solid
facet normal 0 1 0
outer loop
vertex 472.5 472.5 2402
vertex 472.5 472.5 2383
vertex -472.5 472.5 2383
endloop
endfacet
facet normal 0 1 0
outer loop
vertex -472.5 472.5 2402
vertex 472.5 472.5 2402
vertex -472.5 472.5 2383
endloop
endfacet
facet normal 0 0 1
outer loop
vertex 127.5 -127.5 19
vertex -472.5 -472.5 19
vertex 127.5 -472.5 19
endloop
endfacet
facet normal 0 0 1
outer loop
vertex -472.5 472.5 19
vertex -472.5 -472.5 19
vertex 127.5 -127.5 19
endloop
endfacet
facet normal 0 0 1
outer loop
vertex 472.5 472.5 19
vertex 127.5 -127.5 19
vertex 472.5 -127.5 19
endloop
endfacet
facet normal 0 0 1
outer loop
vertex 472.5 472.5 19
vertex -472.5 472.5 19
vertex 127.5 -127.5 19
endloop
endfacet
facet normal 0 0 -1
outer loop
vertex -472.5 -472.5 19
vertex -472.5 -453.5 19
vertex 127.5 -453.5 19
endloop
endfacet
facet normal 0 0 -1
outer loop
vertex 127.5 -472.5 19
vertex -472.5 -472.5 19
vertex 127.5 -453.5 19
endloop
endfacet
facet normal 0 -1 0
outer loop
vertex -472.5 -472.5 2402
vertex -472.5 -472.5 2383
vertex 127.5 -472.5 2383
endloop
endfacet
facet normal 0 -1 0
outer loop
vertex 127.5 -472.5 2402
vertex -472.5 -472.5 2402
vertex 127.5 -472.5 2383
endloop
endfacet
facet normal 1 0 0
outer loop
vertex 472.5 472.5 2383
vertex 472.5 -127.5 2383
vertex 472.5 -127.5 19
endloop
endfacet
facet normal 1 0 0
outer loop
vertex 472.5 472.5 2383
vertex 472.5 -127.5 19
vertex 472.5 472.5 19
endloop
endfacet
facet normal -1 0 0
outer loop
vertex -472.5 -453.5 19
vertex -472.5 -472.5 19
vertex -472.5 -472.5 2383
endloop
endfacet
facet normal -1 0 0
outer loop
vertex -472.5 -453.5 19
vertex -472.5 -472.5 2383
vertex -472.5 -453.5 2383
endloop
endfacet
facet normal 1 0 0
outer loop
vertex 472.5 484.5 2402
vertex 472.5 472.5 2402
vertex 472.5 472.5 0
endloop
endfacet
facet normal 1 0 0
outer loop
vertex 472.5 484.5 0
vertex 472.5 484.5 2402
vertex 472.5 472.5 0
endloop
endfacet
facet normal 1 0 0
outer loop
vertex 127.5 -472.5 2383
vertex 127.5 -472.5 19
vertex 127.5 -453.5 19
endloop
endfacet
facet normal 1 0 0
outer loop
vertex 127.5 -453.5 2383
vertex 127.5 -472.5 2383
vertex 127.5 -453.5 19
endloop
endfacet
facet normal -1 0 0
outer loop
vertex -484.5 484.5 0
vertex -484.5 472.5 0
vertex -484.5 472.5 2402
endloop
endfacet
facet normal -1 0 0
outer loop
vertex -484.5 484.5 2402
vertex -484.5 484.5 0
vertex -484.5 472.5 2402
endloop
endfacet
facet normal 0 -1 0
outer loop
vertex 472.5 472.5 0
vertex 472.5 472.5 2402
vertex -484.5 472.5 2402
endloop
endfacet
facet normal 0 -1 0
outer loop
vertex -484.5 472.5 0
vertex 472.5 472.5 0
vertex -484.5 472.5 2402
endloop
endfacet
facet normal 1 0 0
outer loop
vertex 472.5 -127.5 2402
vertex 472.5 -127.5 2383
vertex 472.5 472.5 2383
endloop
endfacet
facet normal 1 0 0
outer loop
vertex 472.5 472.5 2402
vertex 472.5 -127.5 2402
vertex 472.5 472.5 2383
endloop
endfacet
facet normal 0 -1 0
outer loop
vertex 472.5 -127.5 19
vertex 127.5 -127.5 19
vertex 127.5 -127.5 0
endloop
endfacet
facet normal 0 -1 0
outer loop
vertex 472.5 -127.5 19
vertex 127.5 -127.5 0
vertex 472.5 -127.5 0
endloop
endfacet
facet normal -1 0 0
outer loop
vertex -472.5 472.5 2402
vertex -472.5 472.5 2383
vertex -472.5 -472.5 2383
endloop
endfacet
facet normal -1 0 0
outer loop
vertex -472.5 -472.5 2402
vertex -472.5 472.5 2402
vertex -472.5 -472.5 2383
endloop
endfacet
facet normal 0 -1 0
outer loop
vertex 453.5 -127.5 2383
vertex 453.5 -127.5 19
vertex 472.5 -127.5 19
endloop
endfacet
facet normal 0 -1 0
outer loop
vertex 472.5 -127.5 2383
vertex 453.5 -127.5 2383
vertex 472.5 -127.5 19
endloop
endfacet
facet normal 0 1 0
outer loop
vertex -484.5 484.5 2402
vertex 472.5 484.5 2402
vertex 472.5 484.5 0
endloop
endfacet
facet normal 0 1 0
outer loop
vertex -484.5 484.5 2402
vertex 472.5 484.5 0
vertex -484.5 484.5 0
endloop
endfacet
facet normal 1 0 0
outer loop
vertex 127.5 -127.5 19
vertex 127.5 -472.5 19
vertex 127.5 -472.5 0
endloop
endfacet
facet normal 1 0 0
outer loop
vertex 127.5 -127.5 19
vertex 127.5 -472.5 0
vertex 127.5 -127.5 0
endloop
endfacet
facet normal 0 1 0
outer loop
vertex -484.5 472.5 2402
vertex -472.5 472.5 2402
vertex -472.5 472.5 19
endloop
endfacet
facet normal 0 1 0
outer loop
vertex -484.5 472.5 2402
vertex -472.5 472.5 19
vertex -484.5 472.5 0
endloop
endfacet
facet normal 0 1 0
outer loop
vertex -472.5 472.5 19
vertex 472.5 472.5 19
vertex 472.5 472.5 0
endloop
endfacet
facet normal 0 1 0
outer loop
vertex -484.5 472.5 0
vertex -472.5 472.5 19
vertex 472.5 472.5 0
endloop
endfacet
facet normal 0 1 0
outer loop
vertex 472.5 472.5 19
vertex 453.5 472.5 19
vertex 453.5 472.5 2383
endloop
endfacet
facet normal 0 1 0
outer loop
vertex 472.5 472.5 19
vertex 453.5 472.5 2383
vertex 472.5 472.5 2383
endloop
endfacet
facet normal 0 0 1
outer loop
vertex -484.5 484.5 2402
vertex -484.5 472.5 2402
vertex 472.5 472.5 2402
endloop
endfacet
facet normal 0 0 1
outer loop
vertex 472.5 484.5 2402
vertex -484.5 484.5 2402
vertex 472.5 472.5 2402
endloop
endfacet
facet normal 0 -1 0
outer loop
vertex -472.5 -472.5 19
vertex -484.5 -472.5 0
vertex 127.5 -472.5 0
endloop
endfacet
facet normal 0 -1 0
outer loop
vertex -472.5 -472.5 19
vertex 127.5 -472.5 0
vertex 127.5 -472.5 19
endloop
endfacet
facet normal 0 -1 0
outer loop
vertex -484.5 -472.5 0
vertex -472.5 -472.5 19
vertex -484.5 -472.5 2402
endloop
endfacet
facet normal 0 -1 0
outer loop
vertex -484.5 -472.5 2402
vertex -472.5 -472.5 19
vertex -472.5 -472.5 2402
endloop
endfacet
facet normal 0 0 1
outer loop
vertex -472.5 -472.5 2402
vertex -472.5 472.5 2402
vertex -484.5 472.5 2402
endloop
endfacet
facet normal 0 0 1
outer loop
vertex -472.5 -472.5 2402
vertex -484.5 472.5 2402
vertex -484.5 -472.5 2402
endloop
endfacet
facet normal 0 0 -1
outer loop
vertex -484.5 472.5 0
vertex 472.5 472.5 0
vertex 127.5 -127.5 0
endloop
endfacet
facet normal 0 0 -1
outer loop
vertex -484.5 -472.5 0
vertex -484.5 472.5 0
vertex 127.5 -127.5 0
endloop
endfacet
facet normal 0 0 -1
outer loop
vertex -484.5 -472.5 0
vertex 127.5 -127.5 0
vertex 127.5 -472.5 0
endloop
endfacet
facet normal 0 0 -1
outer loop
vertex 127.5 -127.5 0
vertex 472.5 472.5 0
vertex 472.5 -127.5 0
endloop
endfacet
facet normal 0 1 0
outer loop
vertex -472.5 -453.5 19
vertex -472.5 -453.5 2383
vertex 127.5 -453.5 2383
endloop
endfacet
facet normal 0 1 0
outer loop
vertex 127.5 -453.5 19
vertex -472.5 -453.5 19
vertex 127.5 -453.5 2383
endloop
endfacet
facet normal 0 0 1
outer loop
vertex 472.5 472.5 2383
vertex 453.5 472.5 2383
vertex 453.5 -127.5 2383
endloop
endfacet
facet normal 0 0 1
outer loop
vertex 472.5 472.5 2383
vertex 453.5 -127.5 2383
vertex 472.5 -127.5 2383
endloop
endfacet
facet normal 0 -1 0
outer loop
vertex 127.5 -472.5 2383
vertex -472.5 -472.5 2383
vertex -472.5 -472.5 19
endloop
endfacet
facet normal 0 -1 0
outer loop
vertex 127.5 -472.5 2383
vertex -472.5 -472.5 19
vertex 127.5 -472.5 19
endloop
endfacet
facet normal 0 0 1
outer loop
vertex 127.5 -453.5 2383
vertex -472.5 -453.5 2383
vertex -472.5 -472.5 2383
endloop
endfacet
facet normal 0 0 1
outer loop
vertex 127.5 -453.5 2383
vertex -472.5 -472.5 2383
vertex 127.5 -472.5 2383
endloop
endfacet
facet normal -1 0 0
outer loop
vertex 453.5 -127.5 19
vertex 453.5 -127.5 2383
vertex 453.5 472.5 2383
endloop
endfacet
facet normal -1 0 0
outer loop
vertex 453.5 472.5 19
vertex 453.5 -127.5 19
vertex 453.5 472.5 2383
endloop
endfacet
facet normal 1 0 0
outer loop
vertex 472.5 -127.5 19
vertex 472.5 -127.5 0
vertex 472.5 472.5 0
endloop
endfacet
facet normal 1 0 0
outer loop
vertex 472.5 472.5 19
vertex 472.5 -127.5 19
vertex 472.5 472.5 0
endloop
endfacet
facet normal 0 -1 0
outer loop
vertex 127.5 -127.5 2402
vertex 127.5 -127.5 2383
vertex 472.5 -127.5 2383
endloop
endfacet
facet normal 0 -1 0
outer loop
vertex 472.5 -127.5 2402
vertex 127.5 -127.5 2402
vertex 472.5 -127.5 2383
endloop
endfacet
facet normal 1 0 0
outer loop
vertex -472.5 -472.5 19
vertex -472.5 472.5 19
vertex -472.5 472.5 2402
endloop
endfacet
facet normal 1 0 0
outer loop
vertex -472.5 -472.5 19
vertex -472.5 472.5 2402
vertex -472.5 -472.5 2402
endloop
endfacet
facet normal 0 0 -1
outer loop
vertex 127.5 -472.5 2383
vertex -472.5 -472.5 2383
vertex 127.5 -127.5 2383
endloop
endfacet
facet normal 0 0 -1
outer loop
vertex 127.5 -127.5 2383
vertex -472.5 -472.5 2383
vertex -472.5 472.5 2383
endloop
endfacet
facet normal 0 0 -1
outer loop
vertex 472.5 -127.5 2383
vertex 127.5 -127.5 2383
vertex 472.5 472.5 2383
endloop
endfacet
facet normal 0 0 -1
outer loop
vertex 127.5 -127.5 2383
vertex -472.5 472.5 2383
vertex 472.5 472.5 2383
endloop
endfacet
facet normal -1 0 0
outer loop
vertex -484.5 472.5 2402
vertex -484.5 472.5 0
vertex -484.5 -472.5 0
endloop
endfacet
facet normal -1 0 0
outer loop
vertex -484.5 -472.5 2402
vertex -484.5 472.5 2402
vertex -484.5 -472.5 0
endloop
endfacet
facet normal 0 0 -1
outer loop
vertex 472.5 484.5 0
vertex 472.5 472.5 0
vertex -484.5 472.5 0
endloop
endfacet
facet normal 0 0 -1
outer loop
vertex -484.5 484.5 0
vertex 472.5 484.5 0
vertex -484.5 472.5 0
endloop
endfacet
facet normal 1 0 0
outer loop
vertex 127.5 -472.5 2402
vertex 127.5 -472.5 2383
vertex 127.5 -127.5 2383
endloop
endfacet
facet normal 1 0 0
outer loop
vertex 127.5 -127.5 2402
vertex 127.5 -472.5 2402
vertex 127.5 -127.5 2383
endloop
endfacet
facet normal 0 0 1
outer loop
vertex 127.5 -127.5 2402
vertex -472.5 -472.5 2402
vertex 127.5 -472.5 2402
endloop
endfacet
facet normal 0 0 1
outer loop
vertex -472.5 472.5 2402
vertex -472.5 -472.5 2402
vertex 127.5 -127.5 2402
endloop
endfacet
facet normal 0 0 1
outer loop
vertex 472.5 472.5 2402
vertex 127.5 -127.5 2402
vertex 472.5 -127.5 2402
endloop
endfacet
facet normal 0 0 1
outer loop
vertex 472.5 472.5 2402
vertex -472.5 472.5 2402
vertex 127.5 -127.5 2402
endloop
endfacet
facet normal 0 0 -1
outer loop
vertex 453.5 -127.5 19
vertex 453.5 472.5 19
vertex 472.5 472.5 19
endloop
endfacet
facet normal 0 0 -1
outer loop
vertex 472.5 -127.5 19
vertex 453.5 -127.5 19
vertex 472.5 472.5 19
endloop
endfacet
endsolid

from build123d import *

# Parameters (mm, degrees)
F0_W      = 945
F0_H      = 945
F2_DEPTH  = 19
F5_W      = 345
F5_H      = 345
F6_DEPTH  = 19.001
F7_W      = 600
F7_H      = 19
F8_DEPTH  = 2364
F7_W_2    = 19
F7_H_2    = 600
F9_DEPTH  = 2364
F10_W     = 600
F10_H     = 19
F11_DEPTH = 19
F12_W     = 945
F12_H     = 2383
F12_H_2   = 19
F13_DEPTH = 12
F14_W     = 945
F14_H     = 19
F15_DEPTH = 12


with BuildPart() as f2:
    # F0 (on Top) → F2 (new body)
    with BuildSketch(Plane.XY):
        Rectangle(F0_W, F0_H)
    extrude(amount=F2_DEPTH)

    # F5 (on face) → F6 (cut, through all)
    with BuildSketch(Plane.XY.offset(19)):
        with Locations((300, -300)):
            Rectangle(F5_W, F5_H)
    extrude(amount=-F6_DEPTH, mode=Mode.SUBTRACT)

    # F12 (on face) → F13 (join)
    with BuildSketch(Plane(origin=(-472.5, 0, 0), x_dir=(0, -1, 0), z_dir=(-1, 0, 0))):
        with Locations((0, 1191.5)):
            Rectangle(F12_W, F12_H)
        with Locations((0, 2392.5)):
            Rectangle(F12_W, F12_H_2)
    extrude(amount=F13_DEPTH)


with BuildPart() as f8:
    # F7 (on face) → F8 (new body)
    with BuildSketch(Plane.XY.offset(19)):
        with Locations((-172.5, -463)):
            Rectangle(F7_W, F7_H)
    extrude(amount=F8_DEPTH)


with BuildPart() as f9:
    # F7 (on face) → F9 (new body)
    with BuildSketch(Plane.XY.offset(19)):
        with Locations((463, 172.5)):
            Rectangle(F7_W_2, F7_H_2)
    extrude(amount=F9_DEPTH)


with BuildPart() as f11:
    # F10 (on face) → F11 (new body)
    with BuildSketch(Plane.XY.offset(2383)):
        Polygon((-472.5, 472.5), (-472.5, -453.5), (127.5, -453.5), (127.5, -127.5), (472.5, -127.5), (472.5, 472.5), align=None)
        with Locations((-172.5, -463)):
            Rectangle(F10_W, F10_H)
    extrude(amount=F11_DEPTH)


with BuildPart() as f15:
    # F14 (on face) → F15 (new body)
    with BuildSketch(Plane(origin=(0, 472.5, 0), x_dir=(-1, 0, 0), z_dir=(0, 1, 0))):
        Polygon((484.5, 2402), (472.5, 2402), (472.5, 2383), (-472.5, 2383), (-472.5, 0), (484.5, 0), align=None)
        with Locations((0, 2392.5)):
            Rectangle(F14_W, F14_H)
    extrude(amount=F15_DEPTH)


solid = Compound([f2.part, f8.part, f9.part, f11.part, f15.part])
